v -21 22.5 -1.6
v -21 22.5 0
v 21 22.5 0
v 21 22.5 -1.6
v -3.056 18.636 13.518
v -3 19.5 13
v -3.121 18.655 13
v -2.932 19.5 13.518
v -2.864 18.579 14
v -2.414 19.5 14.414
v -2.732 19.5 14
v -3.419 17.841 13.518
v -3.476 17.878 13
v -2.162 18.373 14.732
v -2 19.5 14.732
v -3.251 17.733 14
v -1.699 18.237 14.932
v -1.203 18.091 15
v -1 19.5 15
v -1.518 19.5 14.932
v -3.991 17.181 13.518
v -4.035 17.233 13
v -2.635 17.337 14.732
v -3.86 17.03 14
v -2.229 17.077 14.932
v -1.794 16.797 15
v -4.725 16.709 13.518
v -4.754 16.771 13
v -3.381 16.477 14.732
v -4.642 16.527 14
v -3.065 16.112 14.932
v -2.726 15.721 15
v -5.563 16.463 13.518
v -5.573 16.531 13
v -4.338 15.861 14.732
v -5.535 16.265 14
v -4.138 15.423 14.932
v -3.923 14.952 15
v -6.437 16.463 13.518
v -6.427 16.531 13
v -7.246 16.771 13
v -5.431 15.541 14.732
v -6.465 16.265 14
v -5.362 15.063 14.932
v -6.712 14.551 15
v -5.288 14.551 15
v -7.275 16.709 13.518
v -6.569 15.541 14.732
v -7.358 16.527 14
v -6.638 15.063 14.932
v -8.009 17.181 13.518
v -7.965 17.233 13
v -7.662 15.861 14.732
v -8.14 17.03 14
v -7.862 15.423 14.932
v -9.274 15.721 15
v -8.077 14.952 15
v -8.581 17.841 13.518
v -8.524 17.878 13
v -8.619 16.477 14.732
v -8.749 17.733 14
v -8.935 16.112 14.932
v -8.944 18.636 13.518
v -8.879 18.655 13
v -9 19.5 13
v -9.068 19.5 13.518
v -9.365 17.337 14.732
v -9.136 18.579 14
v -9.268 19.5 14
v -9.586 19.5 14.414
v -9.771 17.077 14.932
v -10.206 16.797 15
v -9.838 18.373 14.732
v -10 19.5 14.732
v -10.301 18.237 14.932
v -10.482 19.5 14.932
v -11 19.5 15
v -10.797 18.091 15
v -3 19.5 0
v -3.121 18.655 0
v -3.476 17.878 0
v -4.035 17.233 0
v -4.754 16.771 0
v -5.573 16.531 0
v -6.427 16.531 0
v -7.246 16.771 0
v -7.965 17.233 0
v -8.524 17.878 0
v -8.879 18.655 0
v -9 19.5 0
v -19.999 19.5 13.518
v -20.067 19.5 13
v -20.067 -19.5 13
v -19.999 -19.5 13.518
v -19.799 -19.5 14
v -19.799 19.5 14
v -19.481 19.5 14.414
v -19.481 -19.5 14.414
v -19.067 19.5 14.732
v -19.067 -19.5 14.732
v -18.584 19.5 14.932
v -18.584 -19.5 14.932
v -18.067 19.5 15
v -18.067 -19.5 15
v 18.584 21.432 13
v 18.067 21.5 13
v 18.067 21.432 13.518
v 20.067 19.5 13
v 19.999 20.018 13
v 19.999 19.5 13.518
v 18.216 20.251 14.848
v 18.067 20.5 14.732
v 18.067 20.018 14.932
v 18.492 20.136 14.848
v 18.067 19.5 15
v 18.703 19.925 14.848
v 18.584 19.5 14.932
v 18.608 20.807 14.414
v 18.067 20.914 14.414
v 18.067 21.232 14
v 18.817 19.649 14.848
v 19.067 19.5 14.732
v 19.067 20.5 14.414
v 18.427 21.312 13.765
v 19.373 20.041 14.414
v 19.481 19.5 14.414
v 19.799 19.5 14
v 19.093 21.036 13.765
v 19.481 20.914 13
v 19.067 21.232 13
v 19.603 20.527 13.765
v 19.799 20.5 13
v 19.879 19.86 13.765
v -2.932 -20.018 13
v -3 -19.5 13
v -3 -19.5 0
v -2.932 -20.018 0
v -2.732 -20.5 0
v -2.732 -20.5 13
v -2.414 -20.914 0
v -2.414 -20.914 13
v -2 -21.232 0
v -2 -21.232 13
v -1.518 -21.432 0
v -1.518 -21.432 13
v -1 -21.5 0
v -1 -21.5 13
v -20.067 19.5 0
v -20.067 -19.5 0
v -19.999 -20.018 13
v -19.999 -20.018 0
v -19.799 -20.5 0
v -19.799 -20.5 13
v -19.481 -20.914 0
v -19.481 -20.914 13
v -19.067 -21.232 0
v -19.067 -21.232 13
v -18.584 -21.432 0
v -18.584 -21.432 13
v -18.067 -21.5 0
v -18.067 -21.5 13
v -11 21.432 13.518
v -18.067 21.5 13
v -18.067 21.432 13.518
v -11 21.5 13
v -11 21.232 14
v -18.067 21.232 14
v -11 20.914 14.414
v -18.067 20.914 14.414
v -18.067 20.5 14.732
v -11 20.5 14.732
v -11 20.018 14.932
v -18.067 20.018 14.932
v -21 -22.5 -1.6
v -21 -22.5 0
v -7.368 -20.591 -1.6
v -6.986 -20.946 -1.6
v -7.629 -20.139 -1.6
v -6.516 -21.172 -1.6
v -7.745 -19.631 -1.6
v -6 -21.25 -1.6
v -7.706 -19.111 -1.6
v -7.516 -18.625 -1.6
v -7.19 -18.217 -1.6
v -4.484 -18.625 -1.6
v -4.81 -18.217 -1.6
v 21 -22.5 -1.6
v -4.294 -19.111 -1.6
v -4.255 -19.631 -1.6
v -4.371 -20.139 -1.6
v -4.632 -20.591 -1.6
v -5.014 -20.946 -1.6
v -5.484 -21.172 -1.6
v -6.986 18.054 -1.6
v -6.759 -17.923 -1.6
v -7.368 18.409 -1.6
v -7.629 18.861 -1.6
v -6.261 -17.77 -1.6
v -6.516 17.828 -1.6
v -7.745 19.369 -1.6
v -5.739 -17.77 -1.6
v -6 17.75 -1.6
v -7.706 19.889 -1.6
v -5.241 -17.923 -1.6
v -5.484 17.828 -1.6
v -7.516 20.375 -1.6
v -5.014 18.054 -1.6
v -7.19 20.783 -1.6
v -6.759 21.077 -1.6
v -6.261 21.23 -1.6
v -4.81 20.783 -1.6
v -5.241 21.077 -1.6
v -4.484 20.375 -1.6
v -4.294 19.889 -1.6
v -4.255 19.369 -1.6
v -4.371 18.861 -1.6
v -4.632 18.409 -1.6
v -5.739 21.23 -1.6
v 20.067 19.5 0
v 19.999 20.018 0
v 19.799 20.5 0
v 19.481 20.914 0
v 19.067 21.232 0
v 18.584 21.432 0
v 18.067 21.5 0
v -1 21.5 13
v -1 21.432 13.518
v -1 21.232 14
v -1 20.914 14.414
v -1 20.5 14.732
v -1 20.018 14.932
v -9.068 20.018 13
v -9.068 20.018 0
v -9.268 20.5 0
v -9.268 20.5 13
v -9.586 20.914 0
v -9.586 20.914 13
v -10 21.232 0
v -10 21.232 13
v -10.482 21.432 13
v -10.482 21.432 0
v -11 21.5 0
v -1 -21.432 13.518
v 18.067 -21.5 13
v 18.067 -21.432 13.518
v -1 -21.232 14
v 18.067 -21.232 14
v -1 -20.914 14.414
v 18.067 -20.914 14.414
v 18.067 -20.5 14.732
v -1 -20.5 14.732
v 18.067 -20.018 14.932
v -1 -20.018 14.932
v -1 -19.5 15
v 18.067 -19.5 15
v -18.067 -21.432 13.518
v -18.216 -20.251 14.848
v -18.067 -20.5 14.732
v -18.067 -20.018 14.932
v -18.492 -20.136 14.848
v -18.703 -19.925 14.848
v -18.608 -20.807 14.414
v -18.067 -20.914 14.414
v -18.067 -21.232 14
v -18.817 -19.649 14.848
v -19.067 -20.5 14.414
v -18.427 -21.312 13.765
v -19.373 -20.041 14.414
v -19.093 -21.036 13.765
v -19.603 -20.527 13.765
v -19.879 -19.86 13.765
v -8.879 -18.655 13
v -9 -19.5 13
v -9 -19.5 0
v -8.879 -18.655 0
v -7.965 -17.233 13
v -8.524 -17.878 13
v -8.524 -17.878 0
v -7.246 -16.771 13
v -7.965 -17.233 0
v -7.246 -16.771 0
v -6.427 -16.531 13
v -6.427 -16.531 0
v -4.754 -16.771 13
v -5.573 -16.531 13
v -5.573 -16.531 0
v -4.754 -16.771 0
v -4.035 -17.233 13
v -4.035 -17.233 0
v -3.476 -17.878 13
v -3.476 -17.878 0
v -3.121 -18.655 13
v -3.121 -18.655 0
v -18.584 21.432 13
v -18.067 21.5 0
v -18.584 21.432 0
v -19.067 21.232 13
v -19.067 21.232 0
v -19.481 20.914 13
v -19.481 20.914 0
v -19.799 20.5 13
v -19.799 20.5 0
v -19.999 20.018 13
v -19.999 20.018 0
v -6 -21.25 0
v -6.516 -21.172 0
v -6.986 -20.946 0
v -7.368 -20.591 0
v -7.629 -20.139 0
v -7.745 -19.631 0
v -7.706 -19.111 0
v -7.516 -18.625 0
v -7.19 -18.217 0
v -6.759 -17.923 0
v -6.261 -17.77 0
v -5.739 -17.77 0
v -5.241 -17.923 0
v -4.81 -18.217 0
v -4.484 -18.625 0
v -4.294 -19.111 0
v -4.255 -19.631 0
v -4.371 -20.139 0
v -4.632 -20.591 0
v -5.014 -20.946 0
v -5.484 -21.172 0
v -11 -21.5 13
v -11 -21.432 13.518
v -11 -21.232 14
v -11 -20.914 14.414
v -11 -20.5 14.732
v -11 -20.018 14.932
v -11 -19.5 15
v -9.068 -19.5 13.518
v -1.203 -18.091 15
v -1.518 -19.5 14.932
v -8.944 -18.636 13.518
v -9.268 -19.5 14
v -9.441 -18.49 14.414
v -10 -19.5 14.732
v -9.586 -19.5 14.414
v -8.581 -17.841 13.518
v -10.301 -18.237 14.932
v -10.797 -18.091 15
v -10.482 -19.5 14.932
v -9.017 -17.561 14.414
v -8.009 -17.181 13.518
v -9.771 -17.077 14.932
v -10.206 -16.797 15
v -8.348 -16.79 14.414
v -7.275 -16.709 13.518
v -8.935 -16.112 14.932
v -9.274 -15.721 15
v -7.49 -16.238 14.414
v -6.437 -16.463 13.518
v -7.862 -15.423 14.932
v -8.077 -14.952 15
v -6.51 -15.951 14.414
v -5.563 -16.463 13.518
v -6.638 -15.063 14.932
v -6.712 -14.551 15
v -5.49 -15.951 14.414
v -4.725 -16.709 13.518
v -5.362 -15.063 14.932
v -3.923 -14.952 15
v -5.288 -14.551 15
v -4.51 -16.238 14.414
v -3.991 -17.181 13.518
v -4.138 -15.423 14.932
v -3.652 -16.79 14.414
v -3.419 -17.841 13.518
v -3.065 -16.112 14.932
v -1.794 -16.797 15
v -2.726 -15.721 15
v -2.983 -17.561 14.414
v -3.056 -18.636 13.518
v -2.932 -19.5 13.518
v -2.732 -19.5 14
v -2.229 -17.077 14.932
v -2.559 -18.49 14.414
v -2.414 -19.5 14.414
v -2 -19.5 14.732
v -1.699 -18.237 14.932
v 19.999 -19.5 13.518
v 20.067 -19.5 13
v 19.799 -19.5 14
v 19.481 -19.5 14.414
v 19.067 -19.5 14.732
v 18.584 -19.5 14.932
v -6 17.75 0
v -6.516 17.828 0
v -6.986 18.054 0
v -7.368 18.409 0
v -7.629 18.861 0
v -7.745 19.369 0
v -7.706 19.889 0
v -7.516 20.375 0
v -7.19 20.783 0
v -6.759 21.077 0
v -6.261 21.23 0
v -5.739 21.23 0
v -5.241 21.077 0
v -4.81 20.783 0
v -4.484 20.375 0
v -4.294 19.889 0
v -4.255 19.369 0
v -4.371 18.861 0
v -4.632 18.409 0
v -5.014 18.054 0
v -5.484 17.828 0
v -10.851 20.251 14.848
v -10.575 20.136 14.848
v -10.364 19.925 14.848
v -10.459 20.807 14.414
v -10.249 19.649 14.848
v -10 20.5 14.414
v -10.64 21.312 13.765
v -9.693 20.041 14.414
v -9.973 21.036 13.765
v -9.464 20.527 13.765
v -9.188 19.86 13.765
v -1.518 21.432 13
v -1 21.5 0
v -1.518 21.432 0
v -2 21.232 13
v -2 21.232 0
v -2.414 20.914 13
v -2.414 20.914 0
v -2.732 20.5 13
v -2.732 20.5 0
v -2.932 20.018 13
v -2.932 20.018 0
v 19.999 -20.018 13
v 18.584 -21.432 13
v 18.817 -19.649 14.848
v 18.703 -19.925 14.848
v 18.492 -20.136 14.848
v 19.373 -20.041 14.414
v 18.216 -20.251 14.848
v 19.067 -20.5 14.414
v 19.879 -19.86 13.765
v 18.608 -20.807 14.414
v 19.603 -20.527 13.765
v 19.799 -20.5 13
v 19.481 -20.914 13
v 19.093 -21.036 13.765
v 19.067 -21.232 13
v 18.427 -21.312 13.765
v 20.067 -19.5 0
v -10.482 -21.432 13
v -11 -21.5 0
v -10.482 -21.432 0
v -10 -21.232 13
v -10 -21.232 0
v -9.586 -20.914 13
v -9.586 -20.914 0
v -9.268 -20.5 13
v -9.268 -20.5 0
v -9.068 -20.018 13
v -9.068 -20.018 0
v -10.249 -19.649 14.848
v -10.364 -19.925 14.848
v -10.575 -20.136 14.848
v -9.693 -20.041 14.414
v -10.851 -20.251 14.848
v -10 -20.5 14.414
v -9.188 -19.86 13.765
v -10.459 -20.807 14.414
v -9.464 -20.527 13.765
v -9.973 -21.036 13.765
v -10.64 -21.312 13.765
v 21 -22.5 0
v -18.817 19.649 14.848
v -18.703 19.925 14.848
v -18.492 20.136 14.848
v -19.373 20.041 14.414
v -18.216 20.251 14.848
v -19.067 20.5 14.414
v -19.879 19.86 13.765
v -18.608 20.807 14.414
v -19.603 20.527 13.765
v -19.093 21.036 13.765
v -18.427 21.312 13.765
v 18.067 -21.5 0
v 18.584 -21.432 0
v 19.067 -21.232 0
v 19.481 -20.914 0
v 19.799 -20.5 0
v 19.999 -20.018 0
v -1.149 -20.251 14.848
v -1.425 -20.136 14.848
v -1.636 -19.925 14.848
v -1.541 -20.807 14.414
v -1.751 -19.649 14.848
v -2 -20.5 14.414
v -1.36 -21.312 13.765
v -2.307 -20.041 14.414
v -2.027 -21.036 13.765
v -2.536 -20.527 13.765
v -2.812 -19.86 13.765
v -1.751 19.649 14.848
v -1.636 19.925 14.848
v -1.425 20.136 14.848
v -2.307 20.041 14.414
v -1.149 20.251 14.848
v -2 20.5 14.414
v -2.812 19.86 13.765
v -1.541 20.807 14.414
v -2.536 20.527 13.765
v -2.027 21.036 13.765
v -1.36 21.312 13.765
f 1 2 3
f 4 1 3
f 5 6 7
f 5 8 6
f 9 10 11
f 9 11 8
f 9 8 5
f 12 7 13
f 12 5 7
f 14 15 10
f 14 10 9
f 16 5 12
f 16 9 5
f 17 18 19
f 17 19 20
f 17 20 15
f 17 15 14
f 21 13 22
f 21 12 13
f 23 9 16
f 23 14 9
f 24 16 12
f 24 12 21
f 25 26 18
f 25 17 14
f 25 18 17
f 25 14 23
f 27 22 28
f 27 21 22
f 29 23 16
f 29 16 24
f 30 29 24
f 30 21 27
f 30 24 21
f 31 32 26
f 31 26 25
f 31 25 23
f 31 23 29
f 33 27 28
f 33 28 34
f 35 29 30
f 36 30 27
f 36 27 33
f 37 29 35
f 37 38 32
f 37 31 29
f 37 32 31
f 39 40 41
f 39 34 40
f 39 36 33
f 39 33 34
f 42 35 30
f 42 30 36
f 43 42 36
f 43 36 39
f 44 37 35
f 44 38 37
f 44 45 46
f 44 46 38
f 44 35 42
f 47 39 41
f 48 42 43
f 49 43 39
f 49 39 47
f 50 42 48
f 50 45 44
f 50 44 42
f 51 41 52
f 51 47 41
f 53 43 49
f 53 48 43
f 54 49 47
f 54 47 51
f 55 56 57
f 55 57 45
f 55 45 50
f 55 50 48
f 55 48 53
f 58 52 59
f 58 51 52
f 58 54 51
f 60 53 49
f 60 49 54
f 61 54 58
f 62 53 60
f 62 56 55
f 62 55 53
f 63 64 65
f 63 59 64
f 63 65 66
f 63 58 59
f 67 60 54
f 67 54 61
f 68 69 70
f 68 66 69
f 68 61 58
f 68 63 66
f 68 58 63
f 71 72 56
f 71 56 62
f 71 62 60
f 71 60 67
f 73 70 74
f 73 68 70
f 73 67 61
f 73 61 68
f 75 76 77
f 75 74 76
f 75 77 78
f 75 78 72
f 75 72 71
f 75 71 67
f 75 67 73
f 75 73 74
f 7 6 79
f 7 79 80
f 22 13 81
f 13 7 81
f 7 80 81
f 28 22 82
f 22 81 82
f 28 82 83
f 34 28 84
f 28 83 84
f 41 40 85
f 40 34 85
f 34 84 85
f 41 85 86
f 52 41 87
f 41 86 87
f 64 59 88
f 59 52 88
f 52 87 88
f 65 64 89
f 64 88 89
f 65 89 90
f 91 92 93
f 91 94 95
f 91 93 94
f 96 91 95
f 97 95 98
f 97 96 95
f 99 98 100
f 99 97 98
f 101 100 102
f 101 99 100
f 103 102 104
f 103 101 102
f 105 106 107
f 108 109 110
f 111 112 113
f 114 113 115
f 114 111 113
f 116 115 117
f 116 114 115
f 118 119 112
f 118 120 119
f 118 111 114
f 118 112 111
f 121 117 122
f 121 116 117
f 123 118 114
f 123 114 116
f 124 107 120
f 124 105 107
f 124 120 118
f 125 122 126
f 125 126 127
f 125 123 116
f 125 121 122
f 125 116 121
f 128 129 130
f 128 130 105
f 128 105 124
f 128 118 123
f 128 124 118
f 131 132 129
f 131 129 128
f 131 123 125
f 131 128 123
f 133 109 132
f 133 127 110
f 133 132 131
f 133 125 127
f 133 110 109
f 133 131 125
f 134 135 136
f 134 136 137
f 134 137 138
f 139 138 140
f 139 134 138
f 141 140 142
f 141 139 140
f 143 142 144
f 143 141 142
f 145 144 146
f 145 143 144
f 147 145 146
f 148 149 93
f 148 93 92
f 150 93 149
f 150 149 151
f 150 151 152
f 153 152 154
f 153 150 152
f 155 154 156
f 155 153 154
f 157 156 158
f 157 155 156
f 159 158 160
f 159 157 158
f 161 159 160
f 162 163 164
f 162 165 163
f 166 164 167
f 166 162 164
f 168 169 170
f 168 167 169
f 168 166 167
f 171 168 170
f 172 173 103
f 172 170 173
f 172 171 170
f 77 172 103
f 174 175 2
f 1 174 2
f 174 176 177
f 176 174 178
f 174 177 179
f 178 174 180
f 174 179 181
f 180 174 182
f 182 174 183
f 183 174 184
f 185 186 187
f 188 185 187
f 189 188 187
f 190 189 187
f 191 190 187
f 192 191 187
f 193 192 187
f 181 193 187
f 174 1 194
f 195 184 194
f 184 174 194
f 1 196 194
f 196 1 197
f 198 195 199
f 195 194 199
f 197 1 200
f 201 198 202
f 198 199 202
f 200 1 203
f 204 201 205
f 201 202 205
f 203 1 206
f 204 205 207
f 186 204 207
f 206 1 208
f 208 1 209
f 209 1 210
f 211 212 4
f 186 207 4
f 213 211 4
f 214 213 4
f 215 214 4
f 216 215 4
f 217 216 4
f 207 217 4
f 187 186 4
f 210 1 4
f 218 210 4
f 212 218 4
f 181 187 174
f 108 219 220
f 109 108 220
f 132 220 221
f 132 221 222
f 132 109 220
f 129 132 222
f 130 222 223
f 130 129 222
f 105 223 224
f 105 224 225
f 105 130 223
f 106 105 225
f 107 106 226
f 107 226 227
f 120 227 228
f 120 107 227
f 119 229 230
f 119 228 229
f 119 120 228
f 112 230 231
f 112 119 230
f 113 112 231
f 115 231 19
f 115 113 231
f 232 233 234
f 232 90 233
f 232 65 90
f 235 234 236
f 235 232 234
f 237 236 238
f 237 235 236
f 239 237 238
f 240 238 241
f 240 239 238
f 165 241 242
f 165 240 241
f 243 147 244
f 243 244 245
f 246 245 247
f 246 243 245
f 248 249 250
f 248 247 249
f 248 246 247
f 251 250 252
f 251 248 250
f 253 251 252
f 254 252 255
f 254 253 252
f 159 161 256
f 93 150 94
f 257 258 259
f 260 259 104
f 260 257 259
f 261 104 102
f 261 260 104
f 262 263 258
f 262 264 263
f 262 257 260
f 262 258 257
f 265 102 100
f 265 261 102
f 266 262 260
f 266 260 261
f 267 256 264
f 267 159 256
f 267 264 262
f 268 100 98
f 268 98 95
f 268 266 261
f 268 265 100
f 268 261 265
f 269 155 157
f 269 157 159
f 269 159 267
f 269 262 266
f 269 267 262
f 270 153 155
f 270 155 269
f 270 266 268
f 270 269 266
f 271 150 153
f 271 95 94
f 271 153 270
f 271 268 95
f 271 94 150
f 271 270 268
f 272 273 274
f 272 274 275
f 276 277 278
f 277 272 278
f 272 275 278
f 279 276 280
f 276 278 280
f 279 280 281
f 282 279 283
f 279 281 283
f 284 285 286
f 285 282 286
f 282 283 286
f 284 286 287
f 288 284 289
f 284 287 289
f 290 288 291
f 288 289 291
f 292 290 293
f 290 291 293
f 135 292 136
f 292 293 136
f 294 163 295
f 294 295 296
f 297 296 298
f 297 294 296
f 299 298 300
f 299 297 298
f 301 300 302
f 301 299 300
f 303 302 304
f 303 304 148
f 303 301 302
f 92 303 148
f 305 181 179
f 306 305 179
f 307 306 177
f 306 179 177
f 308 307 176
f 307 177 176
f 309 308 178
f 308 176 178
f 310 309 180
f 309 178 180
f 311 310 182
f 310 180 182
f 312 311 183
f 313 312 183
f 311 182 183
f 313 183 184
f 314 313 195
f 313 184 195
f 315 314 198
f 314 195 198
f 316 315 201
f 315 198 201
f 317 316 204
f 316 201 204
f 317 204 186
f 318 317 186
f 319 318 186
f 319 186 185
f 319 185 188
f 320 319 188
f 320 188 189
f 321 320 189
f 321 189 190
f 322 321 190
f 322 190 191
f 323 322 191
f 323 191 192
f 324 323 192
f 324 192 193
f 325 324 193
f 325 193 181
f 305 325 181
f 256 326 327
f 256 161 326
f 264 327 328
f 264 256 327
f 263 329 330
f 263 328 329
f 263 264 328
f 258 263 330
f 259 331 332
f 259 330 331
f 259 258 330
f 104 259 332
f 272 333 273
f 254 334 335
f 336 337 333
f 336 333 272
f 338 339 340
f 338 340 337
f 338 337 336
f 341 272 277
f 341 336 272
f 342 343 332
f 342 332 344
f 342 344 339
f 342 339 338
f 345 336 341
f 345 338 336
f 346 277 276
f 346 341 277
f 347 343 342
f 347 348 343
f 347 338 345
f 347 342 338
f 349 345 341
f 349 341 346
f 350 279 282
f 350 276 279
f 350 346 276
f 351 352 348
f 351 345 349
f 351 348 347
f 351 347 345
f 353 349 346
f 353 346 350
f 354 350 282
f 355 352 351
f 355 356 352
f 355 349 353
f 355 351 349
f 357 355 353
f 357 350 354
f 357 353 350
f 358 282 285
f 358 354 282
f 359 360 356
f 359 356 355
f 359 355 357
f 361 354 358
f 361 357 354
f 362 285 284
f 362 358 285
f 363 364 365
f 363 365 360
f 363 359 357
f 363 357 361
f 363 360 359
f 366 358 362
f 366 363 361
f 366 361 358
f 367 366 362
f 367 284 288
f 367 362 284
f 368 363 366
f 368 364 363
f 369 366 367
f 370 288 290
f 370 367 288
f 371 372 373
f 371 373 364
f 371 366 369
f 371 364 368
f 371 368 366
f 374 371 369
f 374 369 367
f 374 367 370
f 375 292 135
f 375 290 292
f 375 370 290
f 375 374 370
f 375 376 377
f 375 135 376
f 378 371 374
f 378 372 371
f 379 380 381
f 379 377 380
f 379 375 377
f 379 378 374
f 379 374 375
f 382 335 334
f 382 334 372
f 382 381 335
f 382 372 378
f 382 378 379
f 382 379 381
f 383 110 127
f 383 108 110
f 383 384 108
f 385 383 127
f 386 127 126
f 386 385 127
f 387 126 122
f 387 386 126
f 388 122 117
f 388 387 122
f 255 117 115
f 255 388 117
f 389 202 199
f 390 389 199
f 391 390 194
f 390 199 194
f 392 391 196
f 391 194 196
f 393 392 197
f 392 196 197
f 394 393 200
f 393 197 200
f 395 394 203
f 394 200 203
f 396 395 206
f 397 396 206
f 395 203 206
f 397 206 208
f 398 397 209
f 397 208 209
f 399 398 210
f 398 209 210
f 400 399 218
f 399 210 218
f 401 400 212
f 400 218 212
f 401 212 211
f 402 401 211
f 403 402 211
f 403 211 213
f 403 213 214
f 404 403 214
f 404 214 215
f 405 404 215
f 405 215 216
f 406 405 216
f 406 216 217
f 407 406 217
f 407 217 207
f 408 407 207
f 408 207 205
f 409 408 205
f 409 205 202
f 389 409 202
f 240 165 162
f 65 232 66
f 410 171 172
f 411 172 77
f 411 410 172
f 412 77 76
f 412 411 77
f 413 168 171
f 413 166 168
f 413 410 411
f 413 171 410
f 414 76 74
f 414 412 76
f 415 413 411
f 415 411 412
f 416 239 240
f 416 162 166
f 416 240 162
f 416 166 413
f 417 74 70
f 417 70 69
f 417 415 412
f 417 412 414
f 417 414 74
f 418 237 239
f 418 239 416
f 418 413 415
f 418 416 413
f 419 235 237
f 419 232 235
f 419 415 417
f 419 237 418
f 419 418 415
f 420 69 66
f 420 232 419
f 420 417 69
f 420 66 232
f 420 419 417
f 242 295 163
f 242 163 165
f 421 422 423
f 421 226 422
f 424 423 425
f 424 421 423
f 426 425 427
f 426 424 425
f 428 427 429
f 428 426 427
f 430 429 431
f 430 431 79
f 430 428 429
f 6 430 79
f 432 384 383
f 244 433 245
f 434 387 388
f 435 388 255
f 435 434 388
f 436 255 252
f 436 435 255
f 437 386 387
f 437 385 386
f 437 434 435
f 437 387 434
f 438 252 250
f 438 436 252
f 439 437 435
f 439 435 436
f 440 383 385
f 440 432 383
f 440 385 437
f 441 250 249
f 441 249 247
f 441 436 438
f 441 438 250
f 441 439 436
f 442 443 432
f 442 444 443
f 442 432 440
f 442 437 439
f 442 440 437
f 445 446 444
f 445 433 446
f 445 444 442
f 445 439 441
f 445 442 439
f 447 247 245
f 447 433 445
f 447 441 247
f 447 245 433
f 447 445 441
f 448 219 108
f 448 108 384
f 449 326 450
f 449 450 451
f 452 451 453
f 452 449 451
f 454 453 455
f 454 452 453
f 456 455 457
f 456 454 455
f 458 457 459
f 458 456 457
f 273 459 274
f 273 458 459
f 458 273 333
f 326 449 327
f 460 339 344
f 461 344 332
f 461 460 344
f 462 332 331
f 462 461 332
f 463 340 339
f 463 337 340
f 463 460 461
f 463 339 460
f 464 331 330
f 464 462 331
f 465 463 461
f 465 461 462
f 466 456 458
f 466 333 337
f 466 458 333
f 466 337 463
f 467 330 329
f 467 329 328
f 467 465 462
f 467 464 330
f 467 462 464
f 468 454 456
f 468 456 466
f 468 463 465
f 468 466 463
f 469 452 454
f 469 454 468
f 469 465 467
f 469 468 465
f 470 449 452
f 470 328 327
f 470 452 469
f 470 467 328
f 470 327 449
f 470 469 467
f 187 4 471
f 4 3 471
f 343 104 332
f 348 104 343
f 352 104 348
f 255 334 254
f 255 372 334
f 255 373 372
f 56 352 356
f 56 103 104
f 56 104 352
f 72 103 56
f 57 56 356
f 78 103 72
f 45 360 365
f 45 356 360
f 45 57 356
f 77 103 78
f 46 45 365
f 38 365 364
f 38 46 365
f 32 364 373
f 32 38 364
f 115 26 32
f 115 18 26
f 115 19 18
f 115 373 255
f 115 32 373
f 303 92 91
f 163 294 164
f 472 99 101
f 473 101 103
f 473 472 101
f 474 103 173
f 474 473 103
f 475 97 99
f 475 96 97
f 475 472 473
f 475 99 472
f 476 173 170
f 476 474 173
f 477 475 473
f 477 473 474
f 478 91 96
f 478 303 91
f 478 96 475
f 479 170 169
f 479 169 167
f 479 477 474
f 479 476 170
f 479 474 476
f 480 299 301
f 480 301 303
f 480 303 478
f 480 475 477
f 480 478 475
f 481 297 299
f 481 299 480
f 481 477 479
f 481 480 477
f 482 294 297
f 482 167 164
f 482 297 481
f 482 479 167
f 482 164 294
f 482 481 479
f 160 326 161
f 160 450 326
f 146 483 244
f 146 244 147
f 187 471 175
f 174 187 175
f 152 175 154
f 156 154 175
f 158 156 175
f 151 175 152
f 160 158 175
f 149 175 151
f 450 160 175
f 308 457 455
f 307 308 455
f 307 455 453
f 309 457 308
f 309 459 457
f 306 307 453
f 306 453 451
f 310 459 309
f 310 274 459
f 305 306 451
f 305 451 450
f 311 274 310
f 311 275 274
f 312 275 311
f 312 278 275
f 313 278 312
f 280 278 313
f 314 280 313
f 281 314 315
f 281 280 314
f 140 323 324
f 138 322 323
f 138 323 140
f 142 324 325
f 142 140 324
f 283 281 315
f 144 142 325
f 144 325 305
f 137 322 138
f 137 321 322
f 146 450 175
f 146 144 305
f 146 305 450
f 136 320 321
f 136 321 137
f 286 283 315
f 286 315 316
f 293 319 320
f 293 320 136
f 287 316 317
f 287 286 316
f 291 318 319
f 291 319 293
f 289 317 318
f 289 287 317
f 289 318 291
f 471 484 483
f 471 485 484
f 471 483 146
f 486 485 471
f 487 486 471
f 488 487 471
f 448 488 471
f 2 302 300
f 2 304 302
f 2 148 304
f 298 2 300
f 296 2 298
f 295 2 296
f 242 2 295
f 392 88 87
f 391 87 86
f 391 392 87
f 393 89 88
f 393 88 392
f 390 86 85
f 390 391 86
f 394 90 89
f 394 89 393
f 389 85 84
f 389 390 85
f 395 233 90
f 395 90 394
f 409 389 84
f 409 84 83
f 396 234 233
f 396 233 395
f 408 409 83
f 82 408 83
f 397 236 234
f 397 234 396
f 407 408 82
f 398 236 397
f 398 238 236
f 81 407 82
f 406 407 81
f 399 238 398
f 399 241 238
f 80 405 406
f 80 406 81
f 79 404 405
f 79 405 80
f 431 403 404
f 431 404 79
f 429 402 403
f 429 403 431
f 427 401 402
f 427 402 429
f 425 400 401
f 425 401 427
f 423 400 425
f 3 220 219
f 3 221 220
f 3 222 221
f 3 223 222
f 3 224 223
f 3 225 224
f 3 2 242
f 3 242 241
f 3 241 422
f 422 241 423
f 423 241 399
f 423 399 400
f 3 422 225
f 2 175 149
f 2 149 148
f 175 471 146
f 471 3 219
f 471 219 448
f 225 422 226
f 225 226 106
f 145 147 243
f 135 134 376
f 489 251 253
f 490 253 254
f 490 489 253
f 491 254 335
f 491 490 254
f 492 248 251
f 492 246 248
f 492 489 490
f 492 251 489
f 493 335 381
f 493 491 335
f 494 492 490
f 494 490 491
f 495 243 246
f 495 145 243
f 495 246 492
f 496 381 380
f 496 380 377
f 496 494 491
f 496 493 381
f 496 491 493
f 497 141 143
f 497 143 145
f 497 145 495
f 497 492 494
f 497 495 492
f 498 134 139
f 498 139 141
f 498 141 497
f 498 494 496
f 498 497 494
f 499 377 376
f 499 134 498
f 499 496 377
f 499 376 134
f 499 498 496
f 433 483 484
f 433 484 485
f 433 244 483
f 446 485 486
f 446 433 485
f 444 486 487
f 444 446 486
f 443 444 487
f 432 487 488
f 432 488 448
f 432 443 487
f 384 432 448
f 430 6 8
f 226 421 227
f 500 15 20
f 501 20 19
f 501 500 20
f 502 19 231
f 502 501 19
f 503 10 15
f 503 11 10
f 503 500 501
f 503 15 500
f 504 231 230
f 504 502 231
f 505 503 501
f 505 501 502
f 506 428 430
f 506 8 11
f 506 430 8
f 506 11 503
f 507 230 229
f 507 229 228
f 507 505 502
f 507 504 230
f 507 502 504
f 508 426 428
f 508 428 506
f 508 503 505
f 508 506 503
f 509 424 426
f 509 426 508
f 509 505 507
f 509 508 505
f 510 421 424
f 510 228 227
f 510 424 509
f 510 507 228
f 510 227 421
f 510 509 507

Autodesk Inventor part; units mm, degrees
ref_plane "YZ Plane" through (0, 0, 0) normal (1, 0, 0) x (0, 1, 0)
ref_plane "XZ Plane" through (0, 0, 0) normal (0, 1, 0) x (-1, 0, 0)
ref_plane "XY Plane" through (0, 0, 0) normal (0, 0, 1) x (1, 0, 0)
sketch "Sketch1" plane through (0, 0, 0) normal (0, 0, 1) x (1, 0, 0)
  line L0 (-21, 22.5) -> (21, 22.5)
  line L1 (21, 22.5) -> (21, -22.5)
  line L2 (21, -22.5) -> (-21, -22.5)
  line L3 (-21, -22.5) -> (-21, 22.5)
  line L4 (-21, 22.5) -> (21, -22.5) construction
  line L5 (21, 22.5) -> (-21, -22.5) construction
  line L6 (-6, 19.5) -> (-6, -19.5) construction
  line L7 (-21, 0) -> (21, 0) construction
  arc A0 (-8.2361, 21.5) -> (-3.7639, 21.5) centre (-6, 19.5) ccw
  line L8 (20.0667, -21.5) -> (-20.0667, -21.5)
  line L9 (-20.0667, -21.5) -> (-20.0667, 21.5)
  line L10 (-20.0667, 21.5) -> (20.0667, 21.5)
  line L11 (20.0667, 21.5) -> (20.0667, -21.5)
  line L12 (20.0667, -21.5) -> (-20.0667, 21.5) construction
  line L13 (-20.0667, -21.5) -> (20.0667, 21.5) construction
  arc A1 (-3.7639, -21.5) -> (-8.2361, -21.5) centre (-6, -19.5) ccw
  point P0 (0, 0)
  point P1 (-8.2361, -21.5)
  point P2 (-3.7639, -21.5)
  dimension "d0" = 42
  dimension "d1" = 45
  dimension "d2" = 15
  dimension "d3" = 39
  dimension "d6" = 1
  dimension "d7" = 6
extrude "Extrusion1" add sketch "Sketch1" against normal blind 1.6 contours L0 L1 L2 L3 | L10 A0 | A0 L10 L11 L8 A1 L9 | A1 L8
extrude "Extrusion2" add sketch "Sketch1" along normal blind 15 contours A0 L10 L11 L8 A1 L9
fillet "Fillet1" radius 2 16 edges at (-3.7639, 21.5, 7.5) (-8.2361, 21.5, 7.5) (-3.7639, -21.5, 7.5) (-8.2361, -21.5, 7.5) (-20.0667, 21.5, 7.5) (-20.0667, -21.5, 7.5) (20.0667, -21.5, 7.5) (20.0667, 21.5, 7.5) (20.0667, 0, 15) (8.1514, 21.5, 15) (-14.1514, 21.5, 15) (-6, 16.5, 15) (-20.0667, 0, 15) (-14.1514, -21.5, 15) (-6, -16.5, 15) (8.1514, -21.5, 15)
hole "Hole1" at (-6, 19.5, 0) at (-6, -19.5, 0) direction (0, 0, -1) diameter 3.5 end through all
properties part number "AKI.DAC-U2704 REV.C" material "Acetal Resin, Black"
